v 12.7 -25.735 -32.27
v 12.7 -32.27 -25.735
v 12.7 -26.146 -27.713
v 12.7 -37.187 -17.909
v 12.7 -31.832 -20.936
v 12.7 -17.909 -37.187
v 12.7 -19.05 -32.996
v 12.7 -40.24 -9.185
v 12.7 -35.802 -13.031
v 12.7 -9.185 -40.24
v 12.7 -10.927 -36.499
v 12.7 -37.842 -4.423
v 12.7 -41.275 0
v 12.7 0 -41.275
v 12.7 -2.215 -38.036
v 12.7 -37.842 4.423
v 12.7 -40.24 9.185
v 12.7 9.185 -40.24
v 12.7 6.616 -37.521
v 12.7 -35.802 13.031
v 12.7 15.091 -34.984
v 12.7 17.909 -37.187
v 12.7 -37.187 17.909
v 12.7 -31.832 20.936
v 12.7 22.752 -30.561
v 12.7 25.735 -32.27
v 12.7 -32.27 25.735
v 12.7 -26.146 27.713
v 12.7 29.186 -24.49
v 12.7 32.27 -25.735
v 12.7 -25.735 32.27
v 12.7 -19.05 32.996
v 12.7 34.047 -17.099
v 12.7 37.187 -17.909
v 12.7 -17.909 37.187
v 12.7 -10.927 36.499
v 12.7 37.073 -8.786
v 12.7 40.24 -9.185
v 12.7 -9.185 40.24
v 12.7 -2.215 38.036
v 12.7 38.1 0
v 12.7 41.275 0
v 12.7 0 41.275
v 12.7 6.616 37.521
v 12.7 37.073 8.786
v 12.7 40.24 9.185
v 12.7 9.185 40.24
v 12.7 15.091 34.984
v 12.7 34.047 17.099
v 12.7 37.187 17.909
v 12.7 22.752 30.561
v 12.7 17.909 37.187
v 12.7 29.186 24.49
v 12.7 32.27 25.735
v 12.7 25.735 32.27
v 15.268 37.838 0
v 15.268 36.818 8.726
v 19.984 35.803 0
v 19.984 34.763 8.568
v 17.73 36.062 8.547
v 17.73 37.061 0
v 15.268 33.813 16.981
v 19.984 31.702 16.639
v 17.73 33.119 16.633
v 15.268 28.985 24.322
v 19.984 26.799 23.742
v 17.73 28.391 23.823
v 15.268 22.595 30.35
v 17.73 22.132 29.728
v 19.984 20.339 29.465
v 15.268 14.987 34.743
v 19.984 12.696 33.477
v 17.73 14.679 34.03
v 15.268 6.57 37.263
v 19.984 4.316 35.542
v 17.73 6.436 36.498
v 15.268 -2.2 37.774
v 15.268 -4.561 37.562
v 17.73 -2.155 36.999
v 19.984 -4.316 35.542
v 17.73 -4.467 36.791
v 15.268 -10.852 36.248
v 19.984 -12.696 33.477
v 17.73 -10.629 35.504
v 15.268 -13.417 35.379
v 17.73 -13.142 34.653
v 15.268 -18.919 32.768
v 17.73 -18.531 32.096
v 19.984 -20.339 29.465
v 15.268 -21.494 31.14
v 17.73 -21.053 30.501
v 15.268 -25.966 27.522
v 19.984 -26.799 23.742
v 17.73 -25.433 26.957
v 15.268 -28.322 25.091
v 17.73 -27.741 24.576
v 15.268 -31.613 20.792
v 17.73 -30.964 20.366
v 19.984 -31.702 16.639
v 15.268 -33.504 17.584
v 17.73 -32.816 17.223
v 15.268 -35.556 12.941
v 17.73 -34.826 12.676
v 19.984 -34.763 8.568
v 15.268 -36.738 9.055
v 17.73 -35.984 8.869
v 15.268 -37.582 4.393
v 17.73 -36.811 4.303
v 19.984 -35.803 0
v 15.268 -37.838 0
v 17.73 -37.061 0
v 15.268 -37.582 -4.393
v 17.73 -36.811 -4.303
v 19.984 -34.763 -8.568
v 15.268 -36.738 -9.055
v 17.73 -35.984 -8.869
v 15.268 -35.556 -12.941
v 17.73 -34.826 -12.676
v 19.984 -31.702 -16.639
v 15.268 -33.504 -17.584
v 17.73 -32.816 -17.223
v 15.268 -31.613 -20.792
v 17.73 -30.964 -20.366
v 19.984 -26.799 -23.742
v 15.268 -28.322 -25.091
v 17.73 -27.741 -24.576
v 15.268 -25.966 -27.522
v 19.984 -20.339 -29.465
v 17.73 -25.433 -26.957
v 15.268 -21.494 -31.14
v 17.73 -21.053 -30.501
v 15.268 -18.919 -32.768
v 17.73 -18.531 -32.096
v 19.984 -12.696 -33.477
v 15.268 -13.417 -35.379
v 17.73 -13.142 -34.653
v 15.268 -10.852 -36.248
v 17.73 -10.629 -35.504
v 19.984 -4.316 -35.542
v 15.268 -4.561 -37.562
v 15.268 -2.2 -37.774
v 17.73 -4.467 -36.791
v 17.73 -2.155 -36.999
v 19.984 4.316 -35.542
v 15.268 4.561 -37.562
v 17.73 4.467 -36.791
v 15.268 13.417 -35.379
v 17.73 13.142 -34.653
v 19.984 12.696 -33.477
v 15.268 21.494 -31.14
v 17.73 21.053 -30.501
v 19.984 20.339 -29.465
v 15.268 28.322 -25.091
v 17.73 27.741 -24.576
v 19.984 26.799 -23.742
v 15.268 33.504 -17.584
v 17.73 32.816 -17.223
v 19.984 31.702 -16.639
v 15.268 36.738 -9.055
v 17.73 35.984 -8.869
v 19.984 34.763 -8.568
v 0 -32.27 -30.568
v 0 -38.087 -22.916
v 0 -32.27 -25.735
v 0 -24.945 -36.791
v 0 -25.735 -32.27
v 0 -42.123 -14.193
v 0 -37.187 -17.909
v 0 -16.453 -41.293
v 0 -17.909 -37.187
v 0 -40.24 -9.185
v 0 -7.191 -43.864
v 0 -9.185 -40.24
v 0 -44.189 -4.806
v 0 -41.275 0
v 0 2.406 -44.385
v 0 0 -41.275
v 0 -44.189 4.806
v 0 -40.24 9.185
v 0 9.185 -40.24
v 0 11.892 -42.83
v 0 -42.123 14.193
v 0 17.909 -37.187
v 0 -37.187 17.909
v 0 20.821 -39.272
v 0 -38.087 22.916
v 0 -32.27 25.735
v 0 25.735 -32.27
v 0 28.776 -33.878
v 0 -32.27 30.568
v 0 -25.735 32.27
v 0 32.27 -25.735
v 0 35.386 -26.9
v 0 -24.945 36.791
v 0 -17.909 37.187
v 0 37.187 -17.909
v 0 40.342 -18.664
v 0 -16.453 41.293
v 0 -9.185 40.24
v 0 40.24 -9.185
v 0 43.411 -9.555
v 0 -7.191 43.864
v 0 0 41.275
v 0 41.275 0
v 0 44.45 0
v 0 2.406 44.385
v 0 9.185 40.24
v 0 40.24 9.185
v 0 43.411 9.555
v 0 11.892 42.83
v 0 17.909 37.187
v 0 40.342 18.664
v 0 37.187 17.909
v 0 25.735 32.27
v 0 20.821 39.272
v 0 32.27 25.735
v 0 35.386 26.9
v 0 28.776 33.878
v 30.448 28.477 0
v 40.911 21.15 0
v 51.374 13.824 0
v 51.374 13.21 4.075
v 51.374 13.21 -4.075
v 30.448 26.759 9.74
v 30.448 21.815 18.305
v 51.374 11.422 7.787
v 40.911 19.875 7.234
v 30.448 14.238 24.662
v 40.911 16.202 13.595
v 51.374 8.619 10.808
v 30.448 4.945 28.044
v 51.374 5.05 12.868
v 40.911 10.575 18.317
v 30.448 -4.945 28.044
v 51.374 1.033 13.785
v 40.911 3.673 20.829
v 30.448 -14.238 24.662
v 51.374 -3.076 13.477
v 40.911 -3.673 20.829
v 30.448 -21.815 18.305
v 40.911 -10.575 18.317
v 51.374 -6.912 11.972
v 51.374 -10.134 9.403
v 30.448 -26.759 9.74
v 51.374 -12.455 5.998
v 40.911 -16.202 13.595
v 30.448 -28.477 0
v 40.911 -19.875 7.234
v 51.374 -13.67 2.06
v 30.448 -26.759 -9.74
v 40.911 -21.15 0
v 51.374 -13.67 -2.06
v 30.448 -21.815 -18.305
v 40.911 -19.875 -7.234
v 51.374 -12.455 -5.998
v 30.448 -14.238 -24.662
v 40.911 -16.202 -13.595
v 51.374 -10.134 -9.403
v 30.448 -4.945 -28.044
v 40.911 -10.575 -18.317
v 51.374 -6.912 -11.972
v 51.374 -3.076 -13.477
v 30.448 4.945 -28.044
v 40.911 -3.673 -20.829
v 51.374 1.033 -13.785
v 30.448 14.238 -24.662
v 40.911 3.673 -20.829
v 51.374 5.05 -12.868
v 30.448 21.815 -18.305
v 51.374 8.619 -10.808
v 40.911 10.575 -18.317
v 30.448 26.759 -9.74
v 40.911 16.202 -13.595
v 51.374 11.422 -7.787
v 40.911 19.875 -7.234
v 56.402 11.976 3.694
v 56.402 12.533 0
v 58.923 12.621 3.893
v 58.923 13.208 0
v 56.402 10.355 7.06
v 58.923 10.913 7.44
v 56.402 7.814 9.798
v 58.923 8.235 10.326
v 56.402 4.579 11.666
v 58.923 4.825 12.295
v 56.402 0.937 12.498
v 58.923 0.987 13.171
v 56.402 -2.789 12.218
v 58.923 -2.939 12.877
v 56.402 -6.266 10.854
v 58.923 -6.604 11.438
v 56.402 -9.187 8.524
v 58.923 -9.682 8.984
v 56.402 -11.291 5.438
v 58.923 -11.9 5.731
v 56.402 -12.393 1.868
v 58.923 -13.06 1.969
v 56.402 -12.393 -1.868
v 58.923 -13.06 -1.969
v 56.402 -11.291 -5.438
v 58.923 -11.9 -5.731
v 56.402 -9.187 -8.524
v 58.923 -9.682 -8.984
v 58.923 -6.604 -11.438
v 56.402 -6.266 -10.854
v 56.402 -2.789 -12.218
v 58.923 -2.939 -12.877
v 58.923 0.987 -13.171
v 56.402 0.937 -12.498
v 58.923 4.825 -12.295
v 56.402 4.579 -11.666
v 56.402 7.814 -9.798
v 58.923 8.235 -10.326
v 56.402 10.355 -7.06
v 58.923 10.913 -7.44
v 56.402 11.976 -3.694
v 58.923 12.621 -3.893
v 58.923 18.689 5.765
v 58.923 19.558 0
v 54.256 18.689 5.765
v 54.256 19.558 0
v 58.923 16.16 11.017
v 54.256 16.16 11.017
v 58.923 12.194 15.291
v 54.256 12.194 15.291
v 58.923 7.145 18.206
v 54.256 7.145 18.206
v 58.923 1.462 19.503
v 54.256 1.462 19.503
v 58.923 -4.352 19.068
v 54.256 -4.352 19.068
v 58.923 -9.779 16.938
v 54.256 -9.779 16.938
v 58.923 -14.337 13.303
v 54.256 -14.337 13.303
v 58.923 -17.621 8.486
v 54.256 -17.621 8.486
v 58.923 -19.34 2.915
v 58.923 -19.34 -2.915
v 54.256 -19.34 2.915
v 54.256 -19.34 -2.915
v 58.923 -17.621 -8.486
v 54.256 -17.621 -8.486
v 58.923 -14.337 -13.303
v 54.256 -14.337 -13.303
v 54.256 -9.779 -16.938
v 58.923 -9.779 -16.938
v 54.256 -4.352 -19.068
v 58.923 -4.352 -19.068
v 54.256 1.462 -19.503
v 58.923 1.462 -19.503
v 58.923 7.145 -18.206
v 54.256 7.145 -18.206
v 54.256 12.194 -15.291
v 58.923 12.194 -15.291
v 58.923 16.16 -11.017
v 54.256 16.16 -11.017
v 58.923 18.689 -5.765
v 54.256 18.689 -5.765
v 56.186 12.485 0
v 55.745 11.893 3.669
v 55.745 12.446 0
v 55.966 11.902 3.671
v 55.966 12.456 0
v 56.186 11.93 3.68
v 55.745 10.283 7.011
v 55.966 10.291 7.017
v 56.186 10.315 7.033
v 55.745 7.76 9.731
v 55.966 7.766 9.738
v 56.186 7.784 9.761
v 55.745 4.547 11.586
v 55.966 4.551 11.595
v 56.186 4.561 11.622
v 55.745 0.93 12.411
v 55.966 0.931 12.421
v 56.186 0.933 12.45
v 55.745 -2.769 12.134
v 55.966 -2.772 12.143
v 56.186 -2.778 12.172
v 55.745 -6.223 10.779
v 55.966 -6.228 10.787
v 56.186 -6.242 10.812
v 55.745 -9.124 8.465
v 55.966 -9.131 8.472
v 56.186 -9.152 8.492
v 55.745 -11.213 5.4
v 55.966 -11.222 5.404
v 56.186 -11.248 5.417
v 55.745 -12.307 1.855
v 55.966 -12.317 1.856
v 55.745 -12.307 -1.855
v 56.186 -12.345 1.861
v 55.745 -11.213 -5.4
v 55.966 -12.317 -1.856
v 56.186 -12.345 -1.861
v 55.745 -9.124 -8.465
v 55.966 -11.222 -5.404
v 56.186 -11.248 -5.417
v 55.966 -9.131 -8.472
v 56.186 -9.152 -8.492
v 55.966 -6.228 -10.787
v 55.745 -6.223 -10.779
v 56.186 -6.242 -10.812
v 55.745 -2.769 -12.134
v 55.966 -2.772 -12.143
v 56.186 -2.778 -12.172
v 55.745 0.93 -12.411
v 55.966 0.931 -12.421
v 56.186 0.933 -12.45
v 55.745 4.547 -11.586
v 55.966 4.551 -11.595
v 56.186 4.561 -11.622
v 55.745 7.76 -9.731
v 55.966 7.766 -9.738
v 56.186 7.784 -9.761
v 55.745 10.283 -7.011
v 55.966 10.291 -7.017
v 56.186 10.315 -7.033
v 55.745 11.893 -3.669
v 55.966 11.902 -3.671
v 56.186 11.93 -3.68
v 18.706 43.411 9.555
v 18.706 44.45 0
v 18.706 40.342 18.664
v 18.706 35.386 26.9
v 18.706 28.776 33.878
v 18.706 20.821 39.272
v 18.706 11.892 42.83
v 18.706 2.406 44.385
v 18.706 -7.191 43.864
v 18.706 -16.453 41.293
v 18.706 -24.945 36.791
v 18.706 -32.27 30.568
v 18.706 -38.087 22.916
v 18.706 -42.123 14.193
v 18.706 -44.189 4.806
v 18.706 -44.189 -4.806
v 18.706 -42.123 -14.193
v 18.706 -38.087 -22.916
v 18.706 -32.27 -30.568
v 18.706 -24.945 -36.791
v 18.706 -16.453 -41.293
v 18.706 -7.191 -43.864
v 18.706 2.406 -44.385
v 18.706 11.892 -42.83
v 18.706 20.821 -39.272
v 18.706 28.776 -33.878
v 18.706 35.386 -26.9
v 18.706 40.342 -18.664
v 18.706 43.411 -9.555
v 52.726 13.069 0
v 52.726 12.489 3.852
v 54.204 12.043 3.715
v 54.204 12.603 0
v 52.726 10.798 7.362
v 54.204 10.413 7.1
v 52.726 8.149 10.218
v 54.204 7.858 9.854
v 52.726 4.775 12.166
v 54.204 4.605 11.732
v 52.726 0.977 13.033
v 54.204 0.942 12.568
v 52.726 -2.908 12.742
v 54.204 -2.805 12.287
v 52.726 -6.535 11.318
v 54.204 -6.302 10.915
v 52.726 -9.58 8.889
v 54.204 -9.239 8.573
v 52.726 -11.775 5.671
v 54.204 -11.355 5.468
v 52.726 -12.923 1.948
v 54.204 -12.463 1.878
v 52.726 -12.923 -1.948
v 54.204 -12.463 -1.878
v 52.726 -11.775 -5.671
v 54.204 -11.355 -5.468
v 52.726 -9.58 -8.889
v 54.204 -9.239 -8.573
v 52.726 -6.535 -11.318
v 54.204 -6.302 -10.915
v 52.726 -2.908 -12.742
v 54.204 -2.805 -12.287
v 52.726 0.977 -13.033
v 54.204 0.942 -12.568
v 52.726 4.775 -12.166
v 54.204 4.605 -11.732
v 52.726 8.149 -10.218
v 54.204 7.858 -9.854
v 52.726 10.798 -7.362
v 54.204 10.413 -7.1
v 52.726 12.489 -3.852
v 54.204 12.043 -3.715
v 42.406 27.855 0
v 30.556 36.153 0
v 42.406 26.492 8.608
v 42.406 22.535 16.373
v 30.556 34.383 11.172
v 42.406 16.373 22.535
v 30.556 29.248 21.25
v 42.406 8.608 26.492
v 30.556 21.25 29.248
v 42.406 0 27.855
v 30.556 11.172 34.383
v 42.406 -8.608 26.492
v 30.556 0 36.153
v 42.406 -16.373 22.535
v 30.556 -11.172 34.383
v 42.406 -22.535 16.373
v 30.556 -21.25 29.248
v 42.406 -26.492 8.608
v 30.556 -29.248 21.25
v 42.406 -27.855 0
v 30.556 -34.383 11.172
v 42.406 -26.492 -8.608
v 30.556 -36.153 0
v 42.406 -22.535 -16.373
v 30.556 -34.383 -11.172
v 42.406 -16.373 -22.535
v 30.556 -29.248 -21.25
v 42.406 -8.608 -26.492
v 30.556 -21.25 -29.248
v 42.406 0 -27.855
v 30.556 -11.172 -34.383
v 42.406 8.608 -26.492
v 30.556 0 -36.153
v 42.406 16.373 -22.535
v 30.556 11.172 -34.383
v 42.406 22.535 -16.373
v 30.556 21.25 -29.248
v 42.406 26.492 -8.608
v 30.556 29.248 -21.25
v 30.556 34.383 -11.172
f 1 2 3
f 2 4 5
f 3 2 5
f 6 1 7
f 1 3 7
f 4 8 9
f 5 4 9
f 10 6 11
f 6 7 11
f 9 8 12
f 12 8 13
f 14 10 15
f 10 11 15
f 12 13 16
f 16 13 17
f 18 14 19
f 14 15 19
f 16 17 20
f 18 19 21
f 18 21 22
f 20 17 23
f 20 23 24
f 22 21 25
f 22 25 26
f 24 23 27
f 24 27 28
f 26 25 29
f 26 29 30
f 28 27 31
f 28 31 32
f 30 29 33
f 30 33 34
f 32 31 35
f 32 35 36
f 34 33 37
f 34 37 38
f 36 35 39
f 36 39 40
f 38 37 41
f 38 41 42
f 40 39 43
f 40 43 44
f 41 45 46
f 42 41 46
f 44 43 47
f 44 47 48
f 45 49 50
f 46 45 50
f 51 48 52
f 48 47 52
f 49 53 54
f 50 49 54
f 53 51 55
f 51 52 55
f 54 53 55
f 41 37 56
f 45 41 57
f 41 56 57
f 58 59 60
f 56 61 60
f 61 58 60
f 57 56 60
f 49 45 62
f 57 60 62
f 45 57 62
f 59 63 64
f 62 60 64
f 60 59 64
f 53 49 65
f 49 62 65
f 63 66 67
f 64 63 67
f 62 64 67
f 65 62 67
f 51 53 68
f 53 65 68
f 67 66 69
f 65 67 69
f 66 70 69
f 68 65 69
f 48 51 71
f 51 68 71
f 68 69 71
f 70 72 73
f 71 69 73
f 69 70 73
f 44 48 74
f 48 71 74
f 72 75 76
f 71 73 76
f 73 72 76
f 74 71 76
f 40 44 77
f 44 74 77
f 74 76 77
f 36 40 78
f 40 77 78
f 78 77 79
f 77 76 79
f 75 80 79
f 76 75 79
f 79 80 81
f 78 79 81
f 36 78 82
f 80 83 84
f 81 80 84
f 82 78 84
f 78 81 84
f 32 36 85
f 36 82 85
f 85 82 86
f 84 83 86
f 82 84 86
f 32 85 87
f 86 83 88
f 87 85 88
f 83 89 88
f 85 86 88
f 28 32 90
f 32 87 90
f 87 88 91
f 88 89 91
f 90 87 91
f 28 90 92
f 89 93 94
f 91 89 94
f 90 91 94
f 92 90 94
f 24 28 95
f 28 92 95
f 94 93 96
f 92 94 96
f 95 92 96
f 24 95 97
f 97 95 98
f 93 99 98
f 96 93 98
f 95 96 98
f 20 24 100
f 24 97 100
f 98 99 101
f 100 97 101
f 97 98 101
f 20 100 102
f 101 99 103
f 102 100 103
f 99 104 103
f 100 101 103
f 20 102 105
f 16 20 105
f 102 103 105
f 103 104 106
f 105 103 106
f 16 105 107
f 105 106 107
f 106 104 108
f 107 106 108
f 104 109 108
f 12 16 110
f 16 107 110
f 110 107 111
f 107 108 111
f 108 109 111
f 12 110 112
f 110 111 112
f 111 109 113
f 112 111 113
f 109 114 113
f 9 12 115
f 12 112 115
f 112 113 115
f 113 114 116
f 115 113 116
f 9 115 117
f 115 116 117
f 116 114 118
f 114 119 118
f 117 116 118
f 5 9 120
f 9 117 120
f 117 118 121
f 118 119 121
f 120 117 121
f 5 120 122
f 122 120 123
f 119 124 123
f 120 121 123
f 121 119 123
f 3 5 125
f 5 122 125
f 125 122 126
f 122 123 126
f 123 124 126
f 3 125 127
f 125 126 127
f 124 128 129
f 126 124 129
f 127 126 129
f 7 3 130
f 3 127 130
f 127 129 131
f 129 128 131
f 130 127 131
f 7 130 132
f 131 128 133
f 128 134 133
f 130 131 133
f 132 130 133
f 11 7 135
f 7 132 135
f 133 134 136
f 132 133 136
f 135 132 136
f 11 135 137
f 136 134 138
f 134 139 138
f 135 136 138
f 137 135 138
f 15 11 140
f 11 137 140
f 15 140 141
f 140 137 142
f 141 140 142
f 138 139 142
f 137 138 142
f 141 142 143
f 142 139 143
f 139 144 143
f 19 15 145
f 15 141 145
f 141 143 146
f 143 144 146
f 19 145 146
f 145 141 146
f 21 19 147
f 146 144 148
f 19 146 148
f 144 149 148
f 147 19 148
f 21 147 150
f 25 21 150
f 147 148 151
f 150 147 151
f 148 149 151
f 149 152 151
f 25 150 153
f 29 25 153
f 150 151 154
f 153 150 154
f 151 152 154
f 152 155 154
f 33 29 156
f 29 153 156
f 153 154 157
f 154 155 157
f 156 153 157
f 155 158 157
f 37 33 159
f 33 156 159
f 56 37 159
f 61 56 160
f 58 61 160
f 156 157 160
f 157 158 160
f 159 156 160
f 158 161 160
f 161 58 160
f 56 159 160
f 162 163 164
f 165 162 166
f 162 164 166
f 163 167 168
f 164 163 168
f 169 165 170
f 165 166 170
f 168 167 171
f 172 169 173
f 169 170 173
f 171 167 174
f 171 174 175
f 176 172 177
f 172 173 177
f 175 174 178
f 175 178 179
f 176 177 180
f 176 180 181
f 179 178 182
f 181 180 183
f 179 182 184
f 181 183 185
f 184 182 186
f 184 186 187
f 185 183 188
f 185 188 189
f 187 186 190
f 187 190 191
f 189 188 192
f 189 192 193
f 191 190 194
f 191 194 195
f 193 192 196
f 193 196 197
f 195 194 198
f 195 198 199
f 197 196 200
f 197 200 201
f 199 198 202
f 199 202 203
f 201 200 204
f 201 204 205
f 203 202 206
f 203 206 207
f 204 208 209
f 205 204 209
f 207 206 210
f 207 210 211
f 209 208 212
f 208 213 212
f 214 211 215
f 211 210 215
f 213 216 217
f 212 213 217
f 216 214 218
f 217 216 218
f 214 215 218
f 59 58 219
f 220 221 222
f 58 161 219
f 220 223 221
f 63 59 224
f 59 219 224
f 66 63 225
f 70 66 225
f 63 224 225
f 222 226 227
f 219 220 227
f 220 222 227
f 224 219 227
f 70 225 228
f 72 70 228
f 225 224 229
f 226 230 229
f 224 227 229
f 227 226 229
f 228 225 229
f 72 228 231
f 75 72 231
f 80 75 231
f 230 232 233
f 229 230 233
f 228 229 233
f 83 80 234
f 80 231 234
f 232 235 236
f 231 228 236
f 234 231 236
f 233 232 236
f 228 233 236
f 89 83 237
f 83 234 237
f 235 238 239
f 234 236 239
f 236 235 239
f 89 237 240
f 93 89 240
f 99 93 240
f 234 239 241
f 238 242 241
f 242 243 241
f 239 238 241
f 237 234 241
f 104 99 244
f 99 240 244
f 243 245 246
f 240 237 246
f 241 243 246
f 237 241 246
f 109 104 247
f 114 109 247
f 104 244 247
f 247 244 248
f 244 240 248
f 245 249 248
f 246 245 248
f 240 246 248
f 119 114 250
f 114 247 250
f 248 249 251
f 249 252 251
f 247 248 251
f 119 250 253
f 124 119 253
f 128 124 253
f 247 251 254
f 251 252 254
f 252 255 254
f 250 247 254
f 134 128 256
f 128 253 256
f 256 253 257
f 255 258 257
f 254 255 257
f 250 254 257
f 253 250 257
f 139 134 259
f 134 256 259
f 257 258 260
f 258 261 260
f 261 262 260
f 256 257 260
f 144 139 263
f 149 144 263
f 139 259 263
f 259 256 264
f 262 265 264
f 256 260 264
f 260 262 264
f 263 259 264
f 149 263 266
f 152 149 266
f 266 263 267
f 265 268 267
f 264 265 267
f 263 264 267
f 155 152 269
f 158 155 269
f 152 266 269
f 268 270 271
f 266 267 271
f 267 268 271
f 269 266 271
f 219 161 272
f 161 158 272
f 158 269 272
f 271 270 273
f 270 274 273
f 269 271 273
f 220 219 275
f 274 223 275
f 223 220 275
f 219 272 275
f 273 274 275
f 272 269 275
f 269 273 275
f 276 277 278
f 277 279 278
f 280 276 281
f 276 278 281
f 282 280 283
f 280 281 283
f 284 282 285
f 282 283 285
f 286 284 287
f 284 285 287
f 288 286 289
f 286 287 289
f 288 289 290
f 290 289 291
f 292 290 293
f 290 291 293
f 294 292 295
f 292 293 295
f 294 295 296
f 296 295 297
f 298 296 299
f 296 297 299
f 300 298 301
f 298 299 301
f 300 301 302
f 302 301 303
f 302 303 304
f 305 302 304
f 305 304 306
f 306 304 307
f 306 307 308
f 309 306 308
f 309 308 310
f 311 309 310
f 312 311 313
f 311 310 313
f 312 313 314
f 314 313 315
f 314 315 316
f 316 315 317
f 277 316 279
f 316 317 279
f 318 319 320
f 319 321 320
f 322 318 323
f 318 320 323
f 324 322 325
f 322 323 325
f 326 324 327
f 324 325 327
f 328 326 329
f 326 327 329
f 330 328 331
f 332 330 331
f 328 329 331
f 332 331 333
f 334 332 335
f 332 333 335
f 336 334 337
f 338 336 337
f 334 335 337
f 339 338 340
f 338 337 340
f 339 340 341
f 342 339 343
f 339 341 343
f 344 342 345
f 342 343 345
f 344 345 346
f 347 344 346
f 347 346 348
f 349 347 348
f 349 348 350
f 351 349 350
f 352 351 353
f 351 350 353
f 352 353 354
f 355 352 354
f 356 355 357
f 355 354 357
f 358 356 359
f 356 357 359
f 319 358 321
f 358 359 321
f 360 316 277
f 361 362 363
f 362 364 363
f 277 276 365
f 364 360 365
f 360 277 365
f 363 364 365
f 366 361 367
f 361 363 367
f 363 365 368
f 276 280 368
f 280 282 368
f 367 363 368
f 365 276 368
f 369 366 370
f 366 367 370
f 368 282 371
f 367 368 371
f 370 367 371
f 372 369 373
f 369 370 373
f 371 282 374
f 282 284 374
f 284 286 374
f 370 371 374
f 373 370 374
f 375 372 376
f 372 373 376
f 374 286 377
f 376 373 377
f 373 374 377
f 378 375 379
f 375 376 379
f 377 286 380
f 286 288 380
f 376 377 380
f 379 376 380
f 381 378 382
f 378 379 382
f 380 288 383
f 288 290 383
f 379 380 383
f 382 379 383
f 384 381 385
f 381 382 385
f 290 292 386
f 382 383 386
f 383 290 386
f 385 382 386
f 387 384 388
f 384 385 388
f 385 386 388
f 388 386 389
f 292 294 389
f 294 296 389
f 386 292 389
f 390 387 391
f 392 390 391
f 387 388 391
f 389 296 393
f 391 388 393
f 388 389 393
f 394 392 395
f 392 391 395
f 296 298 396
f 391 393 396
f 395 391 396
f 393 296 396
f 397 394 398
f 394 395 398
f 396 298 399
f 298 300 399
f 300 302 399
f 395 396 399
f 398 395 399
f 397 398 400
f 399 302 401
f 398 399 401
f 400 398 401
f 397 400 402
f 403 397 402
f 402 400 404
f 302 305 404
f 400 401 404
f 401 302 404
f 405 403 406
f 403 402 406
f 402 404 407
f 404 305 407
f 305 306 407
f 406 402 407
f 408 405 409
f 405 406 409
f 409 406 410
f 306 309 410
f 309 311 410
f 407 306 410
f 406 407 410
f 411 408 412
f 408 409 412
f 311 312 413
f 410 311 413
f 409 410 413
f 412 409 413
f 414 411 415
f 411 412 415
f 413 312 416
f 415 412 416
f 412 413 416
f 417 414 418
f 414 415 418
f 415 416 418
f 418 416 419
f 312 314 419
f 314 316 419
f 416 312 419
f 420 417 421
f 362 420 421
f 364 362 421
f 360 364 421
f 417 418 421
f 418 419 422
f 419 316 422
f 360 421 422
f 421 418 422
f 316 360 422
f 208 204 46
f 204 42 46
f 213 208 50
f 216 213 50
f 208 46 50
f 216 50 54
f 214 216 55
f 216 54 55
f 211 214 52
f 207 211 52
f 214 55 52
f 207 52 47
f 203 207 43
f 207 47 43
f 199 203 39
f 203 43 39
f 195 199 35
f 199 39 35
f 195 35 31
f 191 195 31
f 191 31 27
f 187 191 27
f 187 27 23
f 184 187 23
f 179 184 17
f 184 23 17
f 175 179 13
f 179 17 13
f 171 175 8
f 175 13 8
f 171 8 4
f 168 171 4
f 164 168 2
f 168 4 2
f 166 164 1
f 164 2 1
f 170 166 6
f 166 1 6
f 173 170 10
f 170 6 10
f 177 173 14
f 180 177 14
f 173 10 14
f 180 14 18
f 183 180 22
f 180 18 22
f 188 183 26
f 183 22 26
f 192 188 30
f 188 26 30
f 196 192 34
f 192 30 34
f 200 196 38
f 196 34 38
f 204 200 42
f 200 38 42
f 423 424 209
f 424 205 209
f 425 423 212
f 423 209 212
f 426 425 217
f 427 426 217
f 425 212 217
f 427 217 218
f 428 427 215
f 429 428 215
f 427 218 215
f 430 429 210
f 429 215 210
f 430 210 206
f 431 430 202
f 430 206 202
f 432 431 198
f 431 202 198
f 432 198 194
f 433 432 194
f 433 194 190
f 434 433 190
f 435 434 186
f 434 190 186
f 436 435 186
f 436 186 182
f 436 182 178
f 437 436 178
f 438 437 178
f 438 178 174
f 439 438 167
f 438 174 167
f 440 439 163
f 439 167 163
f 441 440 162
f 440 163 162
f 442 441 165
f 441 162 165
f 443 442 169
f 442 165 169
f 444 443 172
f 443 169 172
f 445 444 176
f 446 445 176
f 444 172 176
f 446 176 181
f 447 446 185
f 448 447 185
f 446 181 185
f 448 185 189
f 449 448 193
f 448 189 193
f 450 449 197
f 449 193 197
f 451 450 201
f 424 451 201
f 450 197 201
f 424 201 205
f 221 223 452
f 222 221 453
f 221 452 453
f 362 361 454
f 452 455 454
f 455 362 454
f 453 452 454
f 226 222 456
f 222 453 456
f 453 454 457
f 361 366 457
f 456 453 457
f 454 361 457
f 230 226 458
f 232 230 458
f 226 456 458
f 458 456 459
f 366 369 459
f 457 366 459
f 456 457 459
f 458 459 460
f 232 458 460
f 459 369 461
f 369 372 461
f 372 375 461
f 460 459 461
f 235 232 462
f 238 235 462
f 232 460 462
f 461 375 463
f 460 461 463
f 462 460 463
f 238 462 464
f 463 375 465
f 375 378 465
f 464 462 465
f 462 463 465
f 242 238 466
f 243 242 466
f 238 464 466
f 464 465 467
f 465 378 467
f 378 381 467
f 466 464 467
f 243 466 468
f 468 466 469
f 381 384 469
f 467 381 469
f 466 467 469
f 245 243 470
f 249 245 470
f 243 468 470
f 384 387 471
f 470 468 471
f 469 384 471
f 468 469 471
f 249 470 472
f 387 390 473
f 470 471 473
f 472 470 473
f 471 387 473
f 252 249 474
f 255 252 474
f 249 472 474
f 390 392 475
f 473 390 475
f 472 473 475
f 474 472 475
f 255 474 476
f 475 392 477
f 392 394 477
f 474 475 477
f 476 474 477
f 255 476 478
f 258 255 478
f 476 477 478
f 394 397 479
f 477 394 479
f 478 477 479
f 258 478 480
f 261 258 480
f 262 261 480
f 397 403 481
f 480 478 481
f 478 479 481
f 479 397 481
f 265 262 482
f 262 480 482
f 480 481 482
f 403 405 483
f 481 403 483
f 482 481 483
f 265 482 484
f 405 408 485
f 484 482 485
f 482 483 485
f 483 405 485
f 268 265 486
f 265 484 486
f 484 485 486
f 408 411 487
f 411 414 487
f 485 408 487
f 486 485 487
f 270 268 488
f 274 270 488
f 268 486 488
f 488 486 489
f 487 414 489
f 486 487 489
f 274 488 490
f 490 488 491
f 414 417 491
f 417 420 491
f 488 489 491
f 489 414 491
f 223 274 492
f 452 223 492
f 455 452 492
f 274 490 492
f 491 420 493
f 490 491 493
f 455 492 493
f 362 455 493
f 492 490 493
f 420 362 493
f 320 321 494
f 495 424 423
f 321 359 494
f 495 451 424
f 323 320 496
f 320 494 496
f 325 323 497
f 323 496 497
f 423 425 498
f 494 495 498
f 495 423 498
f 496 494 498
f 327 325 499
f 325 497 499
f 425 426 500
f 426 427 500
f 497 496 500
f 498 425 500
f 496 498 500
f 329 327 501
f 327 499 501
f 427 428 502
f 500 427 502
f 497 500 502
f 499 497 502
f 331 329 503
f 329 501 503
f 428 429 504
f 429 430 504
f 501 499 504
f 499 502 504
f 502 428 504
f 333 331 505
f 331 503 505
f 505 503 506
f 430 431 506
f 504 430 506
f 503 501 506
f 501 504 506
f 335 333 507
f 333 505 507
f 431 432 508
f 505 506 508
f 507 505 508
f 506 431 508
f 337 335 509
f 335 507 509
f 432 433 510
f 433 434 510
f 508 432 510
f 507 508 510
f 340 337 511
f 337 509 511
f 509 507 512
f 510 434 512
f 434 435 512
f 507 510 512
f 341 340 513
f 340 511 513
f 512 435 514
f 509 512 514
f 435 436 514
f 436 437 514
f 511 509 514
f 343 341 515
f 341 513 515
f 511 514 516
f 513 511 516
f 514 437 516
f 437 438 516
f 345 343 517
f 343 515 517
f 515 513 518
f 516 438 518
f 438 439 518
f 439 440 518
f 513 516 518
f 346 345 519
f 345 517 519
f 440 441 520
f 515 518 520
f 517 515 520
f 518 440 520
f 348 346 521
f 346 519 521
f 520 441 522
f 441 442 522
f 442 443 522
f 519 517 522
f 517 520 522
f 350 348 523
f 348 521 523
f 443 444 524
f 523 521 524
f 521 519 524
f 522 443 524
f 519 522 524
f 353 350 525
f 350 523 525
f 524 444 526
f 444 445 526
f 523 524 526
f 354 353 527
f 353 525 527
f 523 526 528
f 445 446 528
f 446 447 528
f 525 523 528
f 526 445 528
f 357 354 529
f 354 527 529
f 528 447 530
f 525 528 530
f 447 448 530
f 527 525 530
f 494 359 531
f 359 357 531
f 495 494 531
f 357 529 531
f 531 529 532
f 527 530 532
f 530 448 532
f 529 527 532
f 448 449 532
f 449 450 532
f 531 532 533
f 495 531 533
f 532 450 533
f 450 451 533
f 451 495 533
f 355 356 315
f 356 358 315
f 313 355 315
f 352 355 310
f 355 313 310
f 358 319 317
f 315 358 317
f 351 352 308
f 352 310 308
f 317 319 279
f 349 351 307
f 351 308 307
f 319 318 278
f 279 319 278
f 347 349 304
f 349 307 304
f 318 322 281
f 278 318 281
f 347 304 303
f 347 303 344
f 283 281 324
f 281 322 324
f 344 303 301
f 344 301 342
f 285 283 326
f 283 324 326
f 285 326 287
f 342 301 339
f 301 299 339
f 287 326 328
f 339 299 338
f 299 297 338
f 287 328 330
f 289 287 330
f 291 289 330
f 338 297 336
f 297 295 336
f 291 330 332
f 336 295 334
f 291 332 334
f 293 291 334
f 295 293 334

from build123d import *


with BuildPart() as part:
    # Sketch1 → Revolve1 (revolve)
    with BuildSketch(Plane.XY):
        with BuildLine():
            Line((18.706441928, 44.45), (0, 44.45))
            Line((0, 44.45), (0, 41.275))
            Line((0, 41.275), (12.7, 41.275))
            Line((12.7, 41.275), (12.7, 38.1))
            ThreePointArc((12.7, 38.1), (16.518963654, 37.512205275), (19.984420742, 35.803230962))
            Line((19.984420742, 35.803230962), (51.37392791, 13.824061423))
            ThreePointArc((51.37392791, 13.824061423), (53.453202163, 12.798676835), (55.744580355, 12.446))
            ThreePointArc((55.744580355, 12.446), (56.076116883, 12.467730052), (56.40198073, 12.532548401))
            Line((56.40198073, 12.532548401), (58.922800414, 13.208))
            Line((58.922800414, 13.208), (58.922800414, 19.558))
            Line((58.922800414, 19.558), (54.255902112, 19.558))
            Line((54.255902112, 19.558), (18.706441928, 44.45))
        make_face()
    revolve(axis=Axis((0, 0, 0), (1, 0, 0)))


solid = part.part
